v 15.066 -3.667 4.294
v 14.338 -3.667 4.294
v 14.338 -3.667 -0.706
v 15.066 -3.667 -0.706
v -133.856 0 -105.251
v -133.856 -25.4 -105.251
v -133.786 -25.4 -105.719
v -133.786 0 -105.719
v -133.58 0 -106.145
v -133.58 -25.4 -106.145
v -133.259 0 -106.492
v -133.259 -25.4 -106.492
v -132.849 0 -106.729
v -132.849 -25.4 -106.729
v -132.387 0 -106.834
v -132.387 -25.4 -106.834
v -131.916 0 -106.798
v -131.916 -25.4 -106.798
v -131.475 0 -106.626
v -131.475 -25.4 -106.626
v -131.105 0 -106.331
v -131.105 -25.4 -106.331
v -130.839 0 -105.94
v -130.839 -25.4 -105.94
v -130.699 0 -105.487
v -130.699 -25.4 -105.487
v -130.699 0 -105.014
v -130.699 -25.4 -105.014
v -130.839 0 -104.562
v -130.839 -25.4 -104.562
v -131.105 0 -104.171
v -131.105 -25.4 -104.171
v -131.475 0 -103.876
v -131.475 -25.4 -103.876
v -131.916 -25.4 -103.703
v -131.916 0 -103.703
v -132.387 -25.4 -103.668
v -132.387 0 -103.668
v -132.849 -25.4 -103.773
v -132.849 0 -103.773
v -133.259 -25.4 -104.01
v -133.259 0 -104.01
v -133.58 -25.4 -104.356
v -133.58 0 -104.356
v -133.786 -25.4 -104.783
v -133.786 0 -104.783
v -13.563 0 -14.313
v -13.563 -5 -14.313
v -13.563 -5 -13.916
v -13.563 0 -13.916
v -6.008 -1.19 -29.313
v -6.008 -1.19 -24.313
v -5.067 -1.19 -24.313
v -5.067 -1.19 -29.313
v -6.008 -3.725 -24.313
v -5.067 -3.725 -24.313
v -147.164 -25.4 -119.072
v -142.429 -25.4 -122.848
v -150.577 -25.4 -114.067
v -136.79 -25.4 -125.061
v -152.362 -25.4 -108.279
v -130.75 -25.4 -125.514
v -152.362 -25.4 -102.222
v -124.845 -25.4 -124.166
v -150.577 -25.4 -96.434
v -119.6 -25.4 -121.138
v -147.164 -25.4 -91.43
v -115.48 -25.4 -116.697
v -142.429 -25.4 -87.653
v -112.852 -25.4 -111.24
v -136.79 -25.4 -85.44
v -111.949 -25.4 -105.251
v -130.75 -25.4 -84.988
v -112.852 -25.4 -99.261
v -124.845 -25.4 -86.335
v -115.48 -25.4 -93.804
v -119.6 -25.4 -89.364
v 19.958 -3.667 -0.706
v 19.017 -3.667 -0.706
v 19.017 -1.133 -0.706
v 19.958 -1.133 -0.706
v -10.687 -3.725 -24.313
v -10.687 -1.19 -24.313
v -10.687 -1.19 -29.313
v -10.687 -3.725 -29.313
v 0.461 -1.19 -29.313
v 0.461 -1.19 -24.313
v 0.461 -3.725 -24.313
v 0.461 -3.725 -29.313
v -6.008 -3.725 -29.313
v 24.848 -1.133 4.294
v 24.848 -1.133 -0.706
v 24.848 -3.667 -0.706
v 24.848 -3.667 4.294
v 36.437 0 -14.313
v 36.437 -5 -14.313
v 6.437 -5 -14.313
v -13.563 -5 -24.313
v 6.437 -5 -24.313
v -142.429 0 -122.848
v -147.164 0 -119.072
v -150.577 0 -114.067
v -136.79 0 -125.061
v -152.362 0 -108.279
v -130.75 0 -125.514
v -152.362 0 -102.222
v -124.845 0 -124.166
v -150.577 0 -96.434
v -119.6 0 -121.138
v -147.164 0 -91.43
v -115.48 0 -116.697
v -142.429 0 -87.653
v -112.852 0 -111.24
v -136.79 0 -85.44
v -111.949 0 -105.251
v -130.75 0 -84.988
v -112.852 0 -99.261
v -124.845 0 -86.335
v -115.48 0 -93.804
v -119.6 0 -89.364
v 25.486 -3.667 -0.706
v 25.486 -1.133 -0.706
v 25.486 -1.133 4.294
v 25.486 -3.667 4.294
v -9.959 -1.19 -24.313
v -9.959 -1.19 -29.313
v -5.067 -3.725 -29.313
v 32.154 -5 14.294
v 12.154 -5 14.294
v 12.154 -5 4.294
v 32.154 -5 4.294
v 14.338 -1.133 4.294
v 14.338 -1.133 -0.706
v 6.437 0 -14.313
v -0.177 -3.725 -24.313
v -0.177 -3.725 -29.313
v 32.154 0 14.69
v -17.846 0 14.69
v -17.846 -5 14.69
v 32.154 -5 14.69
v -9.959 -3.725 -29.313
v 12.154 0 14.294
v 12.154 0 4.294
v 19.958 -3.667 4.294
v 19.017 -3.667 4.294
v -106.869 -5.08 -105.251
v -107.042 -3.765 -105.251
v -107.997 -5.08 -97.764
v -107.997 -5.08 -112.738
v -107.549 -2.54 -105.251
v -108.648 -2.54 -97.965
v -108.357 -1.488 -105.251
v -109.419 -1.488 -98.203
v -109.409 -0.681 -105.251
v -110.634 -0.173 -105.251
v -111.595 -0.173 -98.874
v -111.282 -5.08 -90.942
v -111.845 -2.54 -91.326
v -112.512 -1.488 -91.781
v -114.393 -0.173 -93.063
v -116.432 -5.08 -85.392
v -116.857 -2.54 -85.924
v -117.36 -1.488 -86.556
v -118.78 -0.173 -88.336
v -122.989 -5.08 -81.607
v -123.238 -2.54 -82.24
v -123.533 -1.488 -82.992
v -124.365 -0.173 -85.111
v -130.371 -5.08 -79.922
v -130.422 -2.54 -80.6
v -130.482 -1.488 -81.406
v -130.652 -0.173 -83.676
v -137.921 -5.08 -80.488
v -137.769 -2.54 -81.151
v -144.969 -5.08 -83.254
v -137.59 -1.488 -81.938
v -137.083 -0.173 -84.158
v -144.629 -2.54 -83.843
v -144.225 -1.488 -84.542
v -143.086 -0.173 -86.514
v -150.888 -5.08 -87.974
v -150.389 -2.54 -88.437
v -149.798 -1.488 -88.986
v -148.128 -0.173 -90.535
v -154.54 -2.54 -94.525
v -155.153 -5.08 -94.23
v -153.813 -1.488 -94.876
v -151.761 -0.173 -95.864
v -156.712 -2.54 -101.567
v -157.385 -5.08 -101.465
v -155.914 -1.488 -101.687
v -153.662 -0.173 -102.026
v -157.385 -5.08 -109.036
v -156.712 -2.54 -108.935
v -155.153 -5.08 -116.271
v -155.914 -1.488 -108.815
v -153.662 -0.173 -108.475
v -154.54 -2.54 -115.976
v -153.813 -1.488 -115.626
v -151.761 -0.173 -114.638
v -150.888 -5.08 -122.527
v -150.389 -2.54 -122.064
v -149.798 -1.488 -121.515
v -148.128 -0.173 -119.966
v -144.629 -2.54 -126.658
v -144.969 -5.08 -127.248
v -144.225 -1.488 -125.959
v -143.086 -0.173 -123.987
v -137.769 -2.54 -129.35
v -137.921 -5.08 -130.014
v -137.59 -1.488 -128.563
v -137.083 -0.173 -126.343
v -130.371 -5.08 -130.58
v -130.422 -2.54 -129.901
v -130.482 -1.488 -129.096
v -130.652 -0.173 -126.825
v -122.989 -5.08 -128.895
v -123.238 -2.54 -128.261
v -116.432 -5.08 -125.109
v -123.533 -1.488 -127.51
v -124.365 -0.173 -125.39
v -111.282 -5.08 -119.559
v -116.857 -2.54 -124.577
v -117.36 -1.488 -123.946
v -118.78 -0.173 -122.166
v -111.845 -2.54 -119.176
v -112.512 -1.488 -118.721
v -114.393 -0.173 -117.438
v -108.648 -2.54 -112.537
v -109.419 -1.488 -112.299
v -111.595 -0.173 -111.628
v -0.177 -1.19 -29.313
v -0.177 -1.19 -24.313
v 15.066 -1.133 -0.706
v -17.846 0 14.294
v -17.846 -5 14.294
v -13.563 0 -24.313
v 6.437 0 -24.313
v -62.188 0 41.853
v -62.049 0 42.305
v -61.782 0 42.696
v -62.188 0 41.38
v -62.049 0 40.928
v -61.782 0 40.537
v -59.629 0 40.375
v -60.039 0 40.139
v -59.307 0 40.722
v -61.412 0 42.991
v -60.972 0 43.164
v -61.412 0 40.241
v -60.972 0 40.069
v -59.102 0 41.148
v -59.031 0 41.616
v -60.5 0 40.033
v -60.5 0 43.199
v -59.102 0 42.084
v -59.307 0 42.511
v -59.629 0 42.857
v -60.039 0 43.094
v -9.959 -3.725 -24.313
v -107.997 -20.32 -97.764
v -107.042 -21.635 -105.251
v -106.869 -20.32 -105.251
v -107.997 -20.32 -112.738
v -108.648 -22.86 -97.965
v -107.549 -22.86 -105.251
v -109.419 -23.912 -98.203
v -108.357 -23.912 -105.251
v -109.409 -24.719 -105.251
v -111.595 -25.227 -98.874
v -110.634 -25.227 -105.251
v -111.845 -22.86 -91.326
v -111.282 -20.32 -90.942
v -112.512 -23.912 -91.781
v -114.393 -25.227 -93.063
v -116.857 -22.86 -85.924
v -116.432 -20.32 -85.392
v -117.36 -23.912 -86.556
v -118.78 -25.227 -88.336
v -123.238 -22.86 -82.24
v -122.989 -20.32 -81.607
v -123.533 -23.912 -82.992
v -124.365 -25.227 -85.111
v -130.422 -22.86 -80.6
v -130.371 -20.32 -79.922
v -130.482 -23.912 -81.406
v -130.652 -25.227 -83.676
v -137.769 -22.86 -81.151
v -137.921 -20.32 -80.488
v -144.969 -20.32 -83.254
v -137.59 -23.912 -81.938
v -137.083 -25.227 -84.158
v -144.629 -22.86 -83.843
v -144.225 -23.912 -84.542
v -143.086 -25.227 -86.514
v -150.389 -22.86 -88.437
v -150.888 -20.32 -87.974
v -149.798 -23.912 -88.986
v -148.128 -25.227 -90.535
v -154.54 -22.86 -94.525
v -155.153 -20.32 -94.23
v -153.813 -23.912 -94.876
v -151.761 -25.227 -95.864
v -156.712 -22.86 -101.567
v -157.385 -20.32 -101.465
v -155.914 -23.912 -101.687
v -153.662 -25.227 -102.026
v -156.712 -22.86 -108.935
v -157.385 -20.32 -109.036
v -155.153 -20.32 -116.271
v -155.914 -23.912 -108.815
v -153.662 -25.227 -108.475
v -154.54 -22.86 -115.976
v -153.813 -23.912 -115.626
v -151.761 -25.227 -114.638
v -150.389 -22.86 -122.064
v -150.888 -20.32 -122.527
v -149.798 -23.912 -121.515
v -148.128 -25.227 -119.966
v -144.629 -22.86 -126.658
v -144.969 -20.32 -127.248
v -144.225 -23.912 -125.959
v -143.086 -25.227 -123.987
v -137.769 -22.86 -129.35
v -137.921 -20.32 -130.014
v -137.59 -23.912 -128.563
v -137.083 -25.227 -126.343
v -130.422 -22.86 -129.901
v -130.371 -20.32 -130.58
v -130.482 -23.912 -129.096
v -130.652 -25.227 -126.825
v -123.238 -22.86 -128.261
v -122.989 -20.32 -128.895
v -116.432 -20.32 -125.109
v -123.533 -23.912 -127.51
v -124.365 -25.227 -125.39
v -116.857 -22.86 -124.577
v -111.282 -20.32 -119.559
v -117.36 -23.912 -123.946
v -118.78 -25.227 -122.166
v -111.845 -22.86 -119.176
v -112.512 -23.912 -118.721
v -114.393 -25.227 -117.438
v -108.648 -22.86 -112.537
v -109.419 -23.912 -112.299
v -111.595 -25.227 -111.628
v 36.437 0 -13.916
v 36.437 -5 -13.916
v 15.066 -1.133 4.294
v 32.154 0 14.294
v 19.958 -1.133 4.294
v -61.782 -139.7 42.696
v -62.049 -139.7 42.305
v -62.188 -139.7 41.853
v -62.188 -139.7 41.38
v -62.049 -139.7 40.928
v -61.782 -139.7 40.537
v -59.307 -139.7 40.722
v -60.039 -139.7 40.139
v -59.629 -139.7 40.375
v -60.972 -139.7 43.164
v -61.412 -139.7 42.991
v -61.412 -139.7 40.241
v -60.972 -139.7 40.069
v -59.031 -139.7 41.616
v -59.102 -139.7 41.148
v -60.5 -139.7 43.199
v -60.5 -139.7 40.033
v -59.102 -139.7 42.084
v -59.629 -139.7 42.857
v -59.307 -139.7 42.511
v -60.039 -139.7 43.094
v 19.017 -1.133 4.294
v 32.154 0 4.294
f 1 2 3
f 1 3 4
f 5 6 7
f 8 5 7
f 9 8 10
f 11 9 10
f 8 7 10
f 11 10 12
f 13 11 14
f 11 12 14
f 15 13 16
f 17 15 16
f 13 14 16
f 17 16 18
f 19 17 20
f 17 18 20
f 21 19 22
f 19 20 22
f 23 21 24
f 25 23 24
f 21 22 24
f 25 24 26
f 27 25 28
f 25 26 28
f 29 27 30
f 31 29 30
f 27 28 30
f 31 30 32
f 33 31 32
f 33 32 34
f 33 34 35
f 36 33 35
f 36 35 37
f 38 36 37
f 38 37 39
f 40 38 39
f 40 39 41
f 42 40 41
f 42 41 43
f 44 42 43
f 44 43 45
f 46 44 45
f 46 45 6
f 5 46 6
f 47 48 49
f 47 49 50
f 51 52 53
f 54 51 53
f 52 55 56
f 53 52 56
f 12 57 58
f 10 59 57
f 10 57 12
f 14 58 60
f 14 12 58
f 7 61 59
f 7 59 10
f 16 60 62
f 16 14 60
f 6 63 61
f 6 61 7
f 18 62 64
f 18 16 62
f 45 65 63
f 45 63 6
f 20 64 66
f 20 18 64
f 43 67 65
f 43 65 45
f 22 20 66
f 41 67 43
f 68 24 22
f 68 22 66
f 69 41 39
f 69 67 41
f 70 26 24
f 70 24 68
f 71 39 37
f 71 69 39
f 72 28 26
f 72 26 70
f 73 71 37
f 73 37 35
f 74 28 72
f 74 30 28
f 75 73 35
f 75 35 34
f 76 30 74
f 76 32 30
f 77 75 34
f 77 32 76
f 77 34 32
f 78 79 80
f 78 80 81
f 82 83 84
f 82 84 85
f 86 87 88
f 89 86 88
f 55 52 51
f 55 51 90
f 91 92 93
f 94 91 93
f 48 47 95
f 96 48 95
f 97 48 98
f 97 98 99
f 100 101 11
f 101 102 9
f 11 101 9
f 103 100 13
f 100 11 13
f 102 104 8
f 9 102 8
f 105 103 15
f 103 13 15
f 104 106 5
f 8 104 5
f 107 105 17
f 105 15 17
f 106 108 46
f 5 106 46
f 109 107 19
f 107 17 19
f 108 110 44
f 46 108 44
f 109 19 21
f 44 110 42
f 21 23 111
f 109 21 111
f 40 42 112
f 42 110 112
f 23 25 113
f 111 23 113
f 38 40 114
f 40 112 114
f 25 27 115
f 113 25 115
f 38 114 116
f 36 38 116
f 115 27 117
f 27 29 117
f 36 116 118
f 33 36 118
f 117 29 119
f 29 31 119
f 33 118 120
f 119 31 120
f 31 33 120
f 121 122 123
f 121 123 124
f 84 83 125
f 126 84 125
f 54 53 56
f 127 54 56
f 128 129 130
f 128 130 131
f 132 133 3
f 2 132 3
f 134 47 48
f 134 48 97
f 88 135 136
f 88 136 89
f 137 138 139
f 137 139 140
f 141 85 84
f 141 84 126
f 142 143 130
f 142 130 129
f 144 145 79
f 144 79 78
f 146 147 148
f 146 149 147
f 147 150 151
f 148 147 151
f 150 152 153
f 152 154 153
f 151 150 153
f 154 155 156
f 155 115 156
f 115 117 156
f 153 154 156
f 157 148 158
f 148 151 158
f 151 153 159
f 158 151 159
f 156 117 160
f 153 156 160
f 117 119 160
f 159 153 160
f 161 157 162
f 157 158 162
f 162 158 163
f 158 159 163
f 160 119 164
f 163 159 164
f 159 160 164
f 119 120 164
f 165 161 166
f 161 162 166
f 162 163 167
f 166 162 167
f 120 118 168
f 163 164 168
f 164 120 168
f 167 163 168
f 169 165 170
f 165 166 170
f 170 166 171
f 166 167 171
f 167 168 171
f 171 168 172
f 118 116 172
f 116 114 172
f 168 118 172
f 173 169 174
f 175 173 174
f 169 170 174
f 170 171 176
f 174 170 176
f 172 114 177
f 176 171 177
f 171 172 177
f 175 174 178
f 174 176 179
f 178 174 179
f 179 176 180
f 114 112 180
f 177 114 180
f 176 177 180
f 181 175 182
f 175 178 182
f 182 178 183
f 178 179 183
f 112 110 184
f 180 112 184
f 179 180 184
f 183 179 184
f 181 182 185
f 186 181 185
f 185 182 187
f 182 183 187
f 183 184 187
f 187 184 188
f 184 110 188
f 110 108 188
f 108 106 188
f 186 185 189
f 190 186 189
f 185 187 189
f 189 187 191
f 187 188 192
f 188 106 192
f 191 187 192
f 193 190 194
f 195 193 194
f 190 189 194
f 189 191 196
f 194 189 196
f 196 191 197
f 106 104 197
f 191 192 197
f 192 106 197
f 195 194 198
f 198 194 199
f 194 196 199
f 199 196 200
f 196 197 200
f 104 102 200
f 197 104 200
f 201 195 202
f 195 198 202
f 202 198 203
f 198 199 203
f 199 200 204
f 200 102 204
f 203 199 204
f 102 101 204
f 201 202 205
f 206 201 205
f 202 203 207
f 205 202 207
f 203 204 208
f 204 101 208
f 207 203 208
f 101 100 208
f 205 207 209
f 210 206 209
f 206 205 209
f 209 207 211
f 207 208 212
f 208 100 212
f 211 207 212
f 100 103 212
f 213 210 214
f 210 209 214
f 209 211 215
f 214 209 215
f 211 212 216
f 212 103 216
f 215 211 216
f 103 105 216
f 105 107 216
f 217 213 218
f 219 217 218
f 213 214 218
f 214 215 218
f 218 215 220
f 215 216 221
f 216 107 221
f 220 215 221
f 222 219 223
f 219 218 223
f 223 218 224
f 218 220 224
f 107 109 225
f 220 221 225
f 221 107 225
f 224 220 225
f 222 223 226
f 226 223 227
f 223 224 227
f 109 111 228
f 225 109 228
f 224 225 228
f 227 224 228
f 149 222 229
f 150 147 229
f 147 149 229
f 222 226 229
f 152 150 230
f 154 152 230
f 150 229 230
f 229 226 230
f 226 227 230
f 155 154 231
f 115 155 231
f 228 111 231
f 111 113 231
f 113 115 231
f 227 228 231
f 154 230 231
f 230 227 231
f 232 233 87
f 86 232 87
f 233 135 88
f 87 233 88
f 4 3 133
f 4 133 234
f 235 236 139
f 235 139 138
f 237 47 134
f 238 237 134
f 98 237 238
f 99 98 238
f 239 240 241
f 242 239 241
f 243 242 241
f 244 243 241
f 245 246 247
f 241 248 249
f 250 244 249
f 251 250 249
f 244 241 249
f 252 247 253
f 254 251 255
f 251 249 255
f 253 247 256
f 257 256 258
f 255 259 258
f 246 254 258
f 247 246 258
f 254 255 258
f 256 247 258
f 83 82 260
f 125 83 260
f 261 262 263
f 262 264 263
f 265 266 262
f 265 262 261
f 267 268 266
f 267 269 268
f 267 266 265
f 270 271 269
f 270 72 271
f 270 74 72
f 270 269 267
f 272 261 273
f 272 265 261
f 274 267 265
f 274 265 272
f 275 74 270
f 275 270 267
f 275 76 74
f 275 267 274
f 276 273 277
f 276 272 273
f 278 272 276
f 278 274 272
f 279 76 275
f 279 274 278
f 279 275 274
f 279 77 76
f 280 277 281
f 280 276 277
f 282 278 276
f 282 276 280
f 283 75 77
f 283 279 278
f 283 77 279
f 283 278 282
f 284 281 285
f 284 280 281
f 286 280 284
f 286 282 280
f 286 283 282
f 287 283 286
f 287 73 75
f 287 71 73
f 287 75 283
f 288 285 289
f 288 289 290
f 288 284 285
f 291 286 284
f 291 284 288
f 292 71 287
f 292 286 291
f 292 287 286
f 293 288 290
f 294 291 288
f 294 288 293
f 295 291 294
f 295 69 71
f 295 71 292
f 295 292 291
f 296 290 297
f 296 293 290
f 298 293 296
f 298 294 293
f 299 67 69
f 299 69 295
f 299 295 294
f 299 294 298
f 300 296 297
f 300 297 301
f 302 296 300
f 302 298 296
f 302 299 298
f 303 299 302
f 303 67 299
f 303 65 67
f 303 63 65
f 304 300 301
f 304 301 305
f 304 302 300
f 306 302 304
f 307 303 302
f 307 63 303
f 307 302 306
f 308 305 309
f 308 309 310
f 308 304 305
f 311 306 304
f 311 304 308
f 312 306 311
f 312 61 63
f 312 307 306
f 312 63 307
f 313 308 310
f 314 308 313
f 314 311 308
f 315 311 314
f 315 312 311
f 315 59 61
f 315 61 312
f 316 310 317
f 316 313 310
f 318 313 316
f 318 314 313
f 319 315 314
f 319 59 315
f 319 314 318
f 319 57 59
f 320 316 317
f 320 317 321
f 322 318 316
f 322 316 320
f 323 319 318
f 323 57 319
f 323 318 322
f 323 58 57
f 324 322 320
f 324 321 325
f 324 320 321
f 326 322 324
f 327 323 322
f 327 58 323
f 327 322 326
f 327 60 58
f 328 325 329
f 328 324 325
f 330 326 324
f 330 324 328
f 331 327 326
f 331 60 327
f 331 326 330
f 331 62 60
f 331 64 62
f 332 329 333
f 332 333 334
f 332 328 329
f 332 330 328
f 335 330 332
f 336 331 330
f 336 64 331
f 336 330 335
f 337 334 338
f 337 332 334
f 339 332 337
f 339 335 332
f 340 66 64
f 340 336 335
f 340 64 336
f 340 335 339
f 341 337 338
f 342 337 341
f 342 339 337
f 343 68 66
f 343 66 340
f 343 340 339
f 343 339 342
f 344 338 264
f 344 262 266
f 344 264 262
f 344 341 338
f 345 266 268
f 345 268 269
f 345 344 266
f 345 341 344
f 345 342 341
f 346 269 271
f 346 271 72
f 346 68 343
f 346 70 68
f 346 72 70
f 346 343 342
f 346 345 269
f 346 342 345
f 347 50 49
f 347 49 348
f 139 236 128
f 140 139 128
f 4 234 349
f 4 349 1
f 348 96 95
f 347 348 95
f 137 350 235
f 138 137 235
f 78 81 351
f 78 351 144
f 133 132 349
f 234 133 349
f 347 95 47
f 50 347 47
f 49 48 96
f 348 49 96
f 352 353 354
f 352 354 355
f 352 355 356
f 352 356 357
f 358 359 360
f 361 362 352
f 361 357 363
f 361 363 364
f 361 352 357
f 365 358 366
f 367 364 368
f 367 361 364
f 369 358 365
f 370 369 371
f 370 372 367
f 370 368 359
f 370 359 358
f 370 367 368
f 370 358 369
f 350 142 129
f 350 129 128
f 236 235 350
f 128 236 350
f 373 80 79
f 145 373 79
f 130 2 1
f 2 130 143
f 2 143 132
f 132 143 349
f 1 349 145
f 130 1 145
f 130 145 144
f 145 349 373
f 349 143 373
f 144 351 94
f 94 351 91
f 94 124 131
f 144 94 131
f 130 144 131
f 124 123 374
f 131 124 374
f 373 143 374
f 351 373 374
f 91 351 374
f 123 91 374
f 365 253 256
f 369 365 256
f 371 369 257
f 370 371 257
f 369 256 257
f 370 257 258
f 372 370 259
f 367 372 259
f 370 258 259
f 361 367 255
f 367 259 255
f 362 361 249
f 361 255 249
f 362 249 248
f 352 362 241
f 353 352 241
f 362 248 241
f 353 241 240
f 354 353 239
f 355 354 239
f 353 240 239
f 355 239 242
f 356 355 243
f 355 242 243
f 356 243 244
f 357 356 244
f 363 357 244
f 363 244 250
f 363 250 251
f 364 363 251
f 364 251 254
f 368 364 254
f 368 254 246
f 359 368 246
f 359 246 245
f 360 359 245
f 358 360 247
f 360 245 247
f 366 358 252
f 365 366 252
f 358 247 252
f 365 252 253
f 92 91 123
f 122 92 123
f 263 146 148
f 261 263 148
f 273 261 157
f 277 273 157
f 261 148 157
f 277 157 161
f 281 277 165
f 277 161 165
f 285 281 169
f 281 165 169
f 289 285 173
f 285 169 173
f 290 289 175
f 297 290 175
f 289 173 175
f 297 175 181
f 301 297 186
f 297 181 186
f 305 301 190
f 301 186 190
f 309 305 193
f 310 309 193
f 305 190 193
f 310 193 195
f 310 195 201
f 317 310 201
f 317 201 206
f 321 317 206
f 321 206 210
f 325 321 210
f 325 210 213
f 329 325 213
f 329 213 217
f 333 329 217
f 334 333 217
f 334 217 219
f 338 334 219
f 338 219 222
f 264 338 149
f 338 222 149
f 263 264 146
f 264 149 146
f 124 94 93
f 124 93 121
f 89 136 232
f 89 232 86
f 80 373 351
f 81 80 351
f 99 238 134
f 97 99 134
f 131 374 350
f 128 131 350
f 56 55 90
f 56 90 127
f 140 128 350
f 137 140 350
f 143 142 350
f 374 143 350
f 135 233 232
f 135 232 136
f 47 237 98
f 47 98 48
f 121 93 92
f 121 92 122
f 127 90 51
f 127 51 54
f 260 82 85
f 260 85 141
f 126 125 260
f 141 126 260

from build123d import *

# Parameters (mm, degrees)
F0_W      = 20
F0_H      = 10
F1_DEPTH  = 5
F2_W      = 20
F2_H      = 5
F2_W_2    = 30
F4_DEPTH  = 0.396875
F3_W      = 30
F3_H      = 5
F3_W_2    = 20
F5_W      = 0.7280735299
F5_H      = 2.5347038172
F5_W_2    = 0.9414851665
F5_W_3    = 0.6383657455
F7_DEPTH  = 5
F6_W      = 0.7280735299
F6_H      = 2.5347038172
F6_W_2    = 0.9414851665
F6_W_3    = 0.6383657455
F8_R      = 1.5875
F9_DEPTH  = 139.7
F10_R     = 25.4
F11_DEPTH = 25.4
F12_D     = 3.175
F13_R     = 5.08


with BuildPart() as f1:
    # F0 (on Front) → F1 (new body)
    with BuildSketch(Plane.XZ):
        with Locations((-3.5627891682, -19.313269183)):
            Rectangle(F0_W, F0_H)
    extrude(amount=F1_DEPTH)


with BuildPart() as f1b:
    # F0 (on Front) → F1, piece 2 (new body)
    with BuildSketch(Plane.XZ):
        with Locations((22.1535649523, 9.2935619131)):
            Rectangle(F0_W, F0_H)
    extrude(amount=F1_DEPTH)

    # F5 (on face) → F7 (join)
    with BuildSketch(Plane(origin=(0, 0, 4.2935619131), x_dir=(1, 0, 0), z_dir=(0, 0, -1))):
        with Locations((14.7023140453, 2.3999989498)):
            Rectangle(F5_W, F5_H)
        with Locations((19.4874030712, 2.3999989498)):
            Rectangle(F5_W_2, F5_H)
        with Locations((25.1673069077, 2.3999989498)):
            Rectangle(F5_W_3, F5_H)
    extrude(amount=F7_DEPTH)


with BuildPart() as f4:
    # F2 (on face) → F4 (new body)
    with BuildSketch(Plane.XY.offset(14.2935619131)):
        with Locations((22.1535649523, -2.5)):
            Rectangle(F2_W, F2_H)
        with Locations((-2.8464350477, -2.5)):
            Rectangle(F2_W_2, F2_H)
    extrude(amount=F4_DEPTH)


with BuildPart() as f4b:
    # F3 (on face) → F4, piece 2 (new body)
    with BuildSketch(Plane.XY.offset(-14.313269183)):
        with Locations((21.4372108318, -2.5)):
            Rectangle(F3_W, F3_H)
        with Locations((-3.5627891682, -2.5)):
            Rectangle(F3_W_2, F3_H)
    extrude(amount=F4_DEPTH)


with BuildPart() as f7:
    # F6 (on face) → F7, piece 2 (new body)
    with BuildSketch(Plane(origin=(0, 0, -24.313269183), x_dir=(1, 0, 0), z_dir=(0, 0, -1))):
        with Locations((-10.3228180669, 2.4573516566)):
            Rectangle(F6_W, F6_H)
        with Locations((-5.5377290411, 2.4573516566)):
            Rectangle(F6_W_2, F6_H)
        with Locations((0.1421747954, 2.4573516566)):
            Rectangle(F6_W_3, F6_H)
    extrude(amount=F7_DEPTH)


with BuildPart() as f9:
    # F8 (on Front) → F9 (new body)
    with BuildSketch(Plane.XZ):
        with Locations((-60.6186874211, 41.6163094342)):
            Circle(F8_R)
    extrude(amount=F9_DEPTH)


with BuildPart() as f11:
    # F10 (on Front) → F11 (new body)
    with BuildSketch(Plane.XZ):
        with Locations((-132.2688162327, -105.2507534623)):
            Circle(F10_R)
    extrude(amount=F11_DEPTH)

    # F12 (through all)
    with Locations(Plane(origin=(0, 0, 0), x_dir=(1, 0, 0), z_dir=(0, 1, 0))):
        with Locations((-132.2688162327, 105.2507534623)):
            Hole(F12_D / 2)

    # F13
    f13_edges = [f11.edges().sort_by_distance(p)[0] for p in [
        (-157.668816, -25.4, -105.250753),
        (-157.668816, 0, -105.250753),
    ]]
    fillet(f13_edges, radius=F13_R)


solid = Compound([f1.part, f1b.part, f4.part, f4b.part, f7.part, f9.part, f11.part])
